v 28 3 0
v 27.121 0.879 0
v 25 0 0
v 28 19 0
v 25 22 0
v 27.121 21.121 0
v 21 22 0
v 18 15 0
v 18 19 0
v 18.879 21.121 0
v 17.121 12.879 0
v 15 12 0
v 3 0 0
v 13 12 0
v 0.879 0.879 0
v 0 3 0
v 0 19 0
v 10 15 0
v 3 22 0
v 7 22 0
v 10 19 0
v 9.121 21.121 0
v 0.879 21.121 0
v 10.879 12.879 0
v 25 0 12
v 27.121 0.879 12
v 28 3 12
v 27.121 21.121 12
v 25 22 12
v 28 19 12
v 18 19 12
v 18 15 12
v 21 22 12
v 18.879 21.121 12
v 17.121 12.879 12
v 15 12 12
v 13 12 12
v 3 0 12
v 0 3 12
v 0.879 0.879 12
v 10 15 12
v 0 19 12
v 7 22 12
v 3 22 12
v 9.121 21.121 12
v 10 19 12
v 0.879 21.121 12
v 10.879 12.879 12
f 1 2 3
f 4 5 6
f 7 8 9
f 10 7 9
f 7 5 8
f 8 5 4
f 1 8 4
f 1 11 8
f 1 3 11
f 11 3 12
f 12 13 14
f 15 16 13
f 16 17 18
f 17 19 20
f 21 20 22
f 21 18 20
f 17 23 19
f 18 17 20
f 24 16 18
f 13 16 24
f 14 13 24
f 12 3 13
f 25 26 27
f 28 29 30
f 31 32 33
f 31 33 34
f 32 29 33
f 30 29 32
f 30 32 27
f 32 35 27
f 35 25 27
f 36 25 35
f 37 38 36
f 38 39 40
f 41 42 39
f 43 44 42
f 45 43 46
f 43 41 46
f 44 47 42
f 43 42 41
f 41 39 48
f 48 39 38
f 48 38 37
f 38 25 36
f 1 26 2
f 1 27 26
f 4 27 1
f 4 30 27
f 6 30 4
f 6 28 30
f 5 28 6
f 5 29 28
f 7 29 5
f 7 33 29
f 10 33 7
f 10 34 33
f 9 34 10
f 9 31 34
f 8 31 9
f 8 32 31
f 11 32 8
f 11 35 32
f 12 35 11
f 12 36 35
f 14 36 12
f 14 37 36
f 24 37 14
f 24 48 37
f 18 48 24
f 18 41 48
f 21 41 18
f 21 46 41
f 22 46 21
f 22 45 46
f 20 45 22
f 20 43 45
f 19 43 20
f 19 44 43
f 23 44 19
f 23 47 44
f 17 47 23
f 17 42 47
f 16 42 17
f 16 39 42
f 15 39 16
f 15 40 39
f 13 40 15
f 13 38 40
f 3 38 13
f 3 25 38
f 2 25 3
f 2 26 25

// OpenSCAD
$fn = 32;

// ----------------------------------------------------------------------
// Eye lug: clevis, 12 mm thick
// ----------------------------------------------------------------------

// --- parameters (mm) ---
profile_height = 12;      // extrusion height
profile_points = 24;      // points of the closed outline

profile = [[0, 3], [0.879, 0.879], [3, 0], [25, 0], [27.121, 0.879], [28, 3], [28, 19], [27.121, 21.121], [25, 22], [21, 22], [18.879, 21.121], [18, 19], [18, 15], [17.121, 12.879], [15, 12], [13, 12], [10.879, 12.879], [10, 15], [10, 19], [9.121, 21.121], [7, 22], [3, 22], [0.879, 21.121], [0, 19]];  // single closed polygon, 24 points, counter clockwise

// --- the one profile operation ---
linear_extrude(height = profile_height) polygon(points = profile);
